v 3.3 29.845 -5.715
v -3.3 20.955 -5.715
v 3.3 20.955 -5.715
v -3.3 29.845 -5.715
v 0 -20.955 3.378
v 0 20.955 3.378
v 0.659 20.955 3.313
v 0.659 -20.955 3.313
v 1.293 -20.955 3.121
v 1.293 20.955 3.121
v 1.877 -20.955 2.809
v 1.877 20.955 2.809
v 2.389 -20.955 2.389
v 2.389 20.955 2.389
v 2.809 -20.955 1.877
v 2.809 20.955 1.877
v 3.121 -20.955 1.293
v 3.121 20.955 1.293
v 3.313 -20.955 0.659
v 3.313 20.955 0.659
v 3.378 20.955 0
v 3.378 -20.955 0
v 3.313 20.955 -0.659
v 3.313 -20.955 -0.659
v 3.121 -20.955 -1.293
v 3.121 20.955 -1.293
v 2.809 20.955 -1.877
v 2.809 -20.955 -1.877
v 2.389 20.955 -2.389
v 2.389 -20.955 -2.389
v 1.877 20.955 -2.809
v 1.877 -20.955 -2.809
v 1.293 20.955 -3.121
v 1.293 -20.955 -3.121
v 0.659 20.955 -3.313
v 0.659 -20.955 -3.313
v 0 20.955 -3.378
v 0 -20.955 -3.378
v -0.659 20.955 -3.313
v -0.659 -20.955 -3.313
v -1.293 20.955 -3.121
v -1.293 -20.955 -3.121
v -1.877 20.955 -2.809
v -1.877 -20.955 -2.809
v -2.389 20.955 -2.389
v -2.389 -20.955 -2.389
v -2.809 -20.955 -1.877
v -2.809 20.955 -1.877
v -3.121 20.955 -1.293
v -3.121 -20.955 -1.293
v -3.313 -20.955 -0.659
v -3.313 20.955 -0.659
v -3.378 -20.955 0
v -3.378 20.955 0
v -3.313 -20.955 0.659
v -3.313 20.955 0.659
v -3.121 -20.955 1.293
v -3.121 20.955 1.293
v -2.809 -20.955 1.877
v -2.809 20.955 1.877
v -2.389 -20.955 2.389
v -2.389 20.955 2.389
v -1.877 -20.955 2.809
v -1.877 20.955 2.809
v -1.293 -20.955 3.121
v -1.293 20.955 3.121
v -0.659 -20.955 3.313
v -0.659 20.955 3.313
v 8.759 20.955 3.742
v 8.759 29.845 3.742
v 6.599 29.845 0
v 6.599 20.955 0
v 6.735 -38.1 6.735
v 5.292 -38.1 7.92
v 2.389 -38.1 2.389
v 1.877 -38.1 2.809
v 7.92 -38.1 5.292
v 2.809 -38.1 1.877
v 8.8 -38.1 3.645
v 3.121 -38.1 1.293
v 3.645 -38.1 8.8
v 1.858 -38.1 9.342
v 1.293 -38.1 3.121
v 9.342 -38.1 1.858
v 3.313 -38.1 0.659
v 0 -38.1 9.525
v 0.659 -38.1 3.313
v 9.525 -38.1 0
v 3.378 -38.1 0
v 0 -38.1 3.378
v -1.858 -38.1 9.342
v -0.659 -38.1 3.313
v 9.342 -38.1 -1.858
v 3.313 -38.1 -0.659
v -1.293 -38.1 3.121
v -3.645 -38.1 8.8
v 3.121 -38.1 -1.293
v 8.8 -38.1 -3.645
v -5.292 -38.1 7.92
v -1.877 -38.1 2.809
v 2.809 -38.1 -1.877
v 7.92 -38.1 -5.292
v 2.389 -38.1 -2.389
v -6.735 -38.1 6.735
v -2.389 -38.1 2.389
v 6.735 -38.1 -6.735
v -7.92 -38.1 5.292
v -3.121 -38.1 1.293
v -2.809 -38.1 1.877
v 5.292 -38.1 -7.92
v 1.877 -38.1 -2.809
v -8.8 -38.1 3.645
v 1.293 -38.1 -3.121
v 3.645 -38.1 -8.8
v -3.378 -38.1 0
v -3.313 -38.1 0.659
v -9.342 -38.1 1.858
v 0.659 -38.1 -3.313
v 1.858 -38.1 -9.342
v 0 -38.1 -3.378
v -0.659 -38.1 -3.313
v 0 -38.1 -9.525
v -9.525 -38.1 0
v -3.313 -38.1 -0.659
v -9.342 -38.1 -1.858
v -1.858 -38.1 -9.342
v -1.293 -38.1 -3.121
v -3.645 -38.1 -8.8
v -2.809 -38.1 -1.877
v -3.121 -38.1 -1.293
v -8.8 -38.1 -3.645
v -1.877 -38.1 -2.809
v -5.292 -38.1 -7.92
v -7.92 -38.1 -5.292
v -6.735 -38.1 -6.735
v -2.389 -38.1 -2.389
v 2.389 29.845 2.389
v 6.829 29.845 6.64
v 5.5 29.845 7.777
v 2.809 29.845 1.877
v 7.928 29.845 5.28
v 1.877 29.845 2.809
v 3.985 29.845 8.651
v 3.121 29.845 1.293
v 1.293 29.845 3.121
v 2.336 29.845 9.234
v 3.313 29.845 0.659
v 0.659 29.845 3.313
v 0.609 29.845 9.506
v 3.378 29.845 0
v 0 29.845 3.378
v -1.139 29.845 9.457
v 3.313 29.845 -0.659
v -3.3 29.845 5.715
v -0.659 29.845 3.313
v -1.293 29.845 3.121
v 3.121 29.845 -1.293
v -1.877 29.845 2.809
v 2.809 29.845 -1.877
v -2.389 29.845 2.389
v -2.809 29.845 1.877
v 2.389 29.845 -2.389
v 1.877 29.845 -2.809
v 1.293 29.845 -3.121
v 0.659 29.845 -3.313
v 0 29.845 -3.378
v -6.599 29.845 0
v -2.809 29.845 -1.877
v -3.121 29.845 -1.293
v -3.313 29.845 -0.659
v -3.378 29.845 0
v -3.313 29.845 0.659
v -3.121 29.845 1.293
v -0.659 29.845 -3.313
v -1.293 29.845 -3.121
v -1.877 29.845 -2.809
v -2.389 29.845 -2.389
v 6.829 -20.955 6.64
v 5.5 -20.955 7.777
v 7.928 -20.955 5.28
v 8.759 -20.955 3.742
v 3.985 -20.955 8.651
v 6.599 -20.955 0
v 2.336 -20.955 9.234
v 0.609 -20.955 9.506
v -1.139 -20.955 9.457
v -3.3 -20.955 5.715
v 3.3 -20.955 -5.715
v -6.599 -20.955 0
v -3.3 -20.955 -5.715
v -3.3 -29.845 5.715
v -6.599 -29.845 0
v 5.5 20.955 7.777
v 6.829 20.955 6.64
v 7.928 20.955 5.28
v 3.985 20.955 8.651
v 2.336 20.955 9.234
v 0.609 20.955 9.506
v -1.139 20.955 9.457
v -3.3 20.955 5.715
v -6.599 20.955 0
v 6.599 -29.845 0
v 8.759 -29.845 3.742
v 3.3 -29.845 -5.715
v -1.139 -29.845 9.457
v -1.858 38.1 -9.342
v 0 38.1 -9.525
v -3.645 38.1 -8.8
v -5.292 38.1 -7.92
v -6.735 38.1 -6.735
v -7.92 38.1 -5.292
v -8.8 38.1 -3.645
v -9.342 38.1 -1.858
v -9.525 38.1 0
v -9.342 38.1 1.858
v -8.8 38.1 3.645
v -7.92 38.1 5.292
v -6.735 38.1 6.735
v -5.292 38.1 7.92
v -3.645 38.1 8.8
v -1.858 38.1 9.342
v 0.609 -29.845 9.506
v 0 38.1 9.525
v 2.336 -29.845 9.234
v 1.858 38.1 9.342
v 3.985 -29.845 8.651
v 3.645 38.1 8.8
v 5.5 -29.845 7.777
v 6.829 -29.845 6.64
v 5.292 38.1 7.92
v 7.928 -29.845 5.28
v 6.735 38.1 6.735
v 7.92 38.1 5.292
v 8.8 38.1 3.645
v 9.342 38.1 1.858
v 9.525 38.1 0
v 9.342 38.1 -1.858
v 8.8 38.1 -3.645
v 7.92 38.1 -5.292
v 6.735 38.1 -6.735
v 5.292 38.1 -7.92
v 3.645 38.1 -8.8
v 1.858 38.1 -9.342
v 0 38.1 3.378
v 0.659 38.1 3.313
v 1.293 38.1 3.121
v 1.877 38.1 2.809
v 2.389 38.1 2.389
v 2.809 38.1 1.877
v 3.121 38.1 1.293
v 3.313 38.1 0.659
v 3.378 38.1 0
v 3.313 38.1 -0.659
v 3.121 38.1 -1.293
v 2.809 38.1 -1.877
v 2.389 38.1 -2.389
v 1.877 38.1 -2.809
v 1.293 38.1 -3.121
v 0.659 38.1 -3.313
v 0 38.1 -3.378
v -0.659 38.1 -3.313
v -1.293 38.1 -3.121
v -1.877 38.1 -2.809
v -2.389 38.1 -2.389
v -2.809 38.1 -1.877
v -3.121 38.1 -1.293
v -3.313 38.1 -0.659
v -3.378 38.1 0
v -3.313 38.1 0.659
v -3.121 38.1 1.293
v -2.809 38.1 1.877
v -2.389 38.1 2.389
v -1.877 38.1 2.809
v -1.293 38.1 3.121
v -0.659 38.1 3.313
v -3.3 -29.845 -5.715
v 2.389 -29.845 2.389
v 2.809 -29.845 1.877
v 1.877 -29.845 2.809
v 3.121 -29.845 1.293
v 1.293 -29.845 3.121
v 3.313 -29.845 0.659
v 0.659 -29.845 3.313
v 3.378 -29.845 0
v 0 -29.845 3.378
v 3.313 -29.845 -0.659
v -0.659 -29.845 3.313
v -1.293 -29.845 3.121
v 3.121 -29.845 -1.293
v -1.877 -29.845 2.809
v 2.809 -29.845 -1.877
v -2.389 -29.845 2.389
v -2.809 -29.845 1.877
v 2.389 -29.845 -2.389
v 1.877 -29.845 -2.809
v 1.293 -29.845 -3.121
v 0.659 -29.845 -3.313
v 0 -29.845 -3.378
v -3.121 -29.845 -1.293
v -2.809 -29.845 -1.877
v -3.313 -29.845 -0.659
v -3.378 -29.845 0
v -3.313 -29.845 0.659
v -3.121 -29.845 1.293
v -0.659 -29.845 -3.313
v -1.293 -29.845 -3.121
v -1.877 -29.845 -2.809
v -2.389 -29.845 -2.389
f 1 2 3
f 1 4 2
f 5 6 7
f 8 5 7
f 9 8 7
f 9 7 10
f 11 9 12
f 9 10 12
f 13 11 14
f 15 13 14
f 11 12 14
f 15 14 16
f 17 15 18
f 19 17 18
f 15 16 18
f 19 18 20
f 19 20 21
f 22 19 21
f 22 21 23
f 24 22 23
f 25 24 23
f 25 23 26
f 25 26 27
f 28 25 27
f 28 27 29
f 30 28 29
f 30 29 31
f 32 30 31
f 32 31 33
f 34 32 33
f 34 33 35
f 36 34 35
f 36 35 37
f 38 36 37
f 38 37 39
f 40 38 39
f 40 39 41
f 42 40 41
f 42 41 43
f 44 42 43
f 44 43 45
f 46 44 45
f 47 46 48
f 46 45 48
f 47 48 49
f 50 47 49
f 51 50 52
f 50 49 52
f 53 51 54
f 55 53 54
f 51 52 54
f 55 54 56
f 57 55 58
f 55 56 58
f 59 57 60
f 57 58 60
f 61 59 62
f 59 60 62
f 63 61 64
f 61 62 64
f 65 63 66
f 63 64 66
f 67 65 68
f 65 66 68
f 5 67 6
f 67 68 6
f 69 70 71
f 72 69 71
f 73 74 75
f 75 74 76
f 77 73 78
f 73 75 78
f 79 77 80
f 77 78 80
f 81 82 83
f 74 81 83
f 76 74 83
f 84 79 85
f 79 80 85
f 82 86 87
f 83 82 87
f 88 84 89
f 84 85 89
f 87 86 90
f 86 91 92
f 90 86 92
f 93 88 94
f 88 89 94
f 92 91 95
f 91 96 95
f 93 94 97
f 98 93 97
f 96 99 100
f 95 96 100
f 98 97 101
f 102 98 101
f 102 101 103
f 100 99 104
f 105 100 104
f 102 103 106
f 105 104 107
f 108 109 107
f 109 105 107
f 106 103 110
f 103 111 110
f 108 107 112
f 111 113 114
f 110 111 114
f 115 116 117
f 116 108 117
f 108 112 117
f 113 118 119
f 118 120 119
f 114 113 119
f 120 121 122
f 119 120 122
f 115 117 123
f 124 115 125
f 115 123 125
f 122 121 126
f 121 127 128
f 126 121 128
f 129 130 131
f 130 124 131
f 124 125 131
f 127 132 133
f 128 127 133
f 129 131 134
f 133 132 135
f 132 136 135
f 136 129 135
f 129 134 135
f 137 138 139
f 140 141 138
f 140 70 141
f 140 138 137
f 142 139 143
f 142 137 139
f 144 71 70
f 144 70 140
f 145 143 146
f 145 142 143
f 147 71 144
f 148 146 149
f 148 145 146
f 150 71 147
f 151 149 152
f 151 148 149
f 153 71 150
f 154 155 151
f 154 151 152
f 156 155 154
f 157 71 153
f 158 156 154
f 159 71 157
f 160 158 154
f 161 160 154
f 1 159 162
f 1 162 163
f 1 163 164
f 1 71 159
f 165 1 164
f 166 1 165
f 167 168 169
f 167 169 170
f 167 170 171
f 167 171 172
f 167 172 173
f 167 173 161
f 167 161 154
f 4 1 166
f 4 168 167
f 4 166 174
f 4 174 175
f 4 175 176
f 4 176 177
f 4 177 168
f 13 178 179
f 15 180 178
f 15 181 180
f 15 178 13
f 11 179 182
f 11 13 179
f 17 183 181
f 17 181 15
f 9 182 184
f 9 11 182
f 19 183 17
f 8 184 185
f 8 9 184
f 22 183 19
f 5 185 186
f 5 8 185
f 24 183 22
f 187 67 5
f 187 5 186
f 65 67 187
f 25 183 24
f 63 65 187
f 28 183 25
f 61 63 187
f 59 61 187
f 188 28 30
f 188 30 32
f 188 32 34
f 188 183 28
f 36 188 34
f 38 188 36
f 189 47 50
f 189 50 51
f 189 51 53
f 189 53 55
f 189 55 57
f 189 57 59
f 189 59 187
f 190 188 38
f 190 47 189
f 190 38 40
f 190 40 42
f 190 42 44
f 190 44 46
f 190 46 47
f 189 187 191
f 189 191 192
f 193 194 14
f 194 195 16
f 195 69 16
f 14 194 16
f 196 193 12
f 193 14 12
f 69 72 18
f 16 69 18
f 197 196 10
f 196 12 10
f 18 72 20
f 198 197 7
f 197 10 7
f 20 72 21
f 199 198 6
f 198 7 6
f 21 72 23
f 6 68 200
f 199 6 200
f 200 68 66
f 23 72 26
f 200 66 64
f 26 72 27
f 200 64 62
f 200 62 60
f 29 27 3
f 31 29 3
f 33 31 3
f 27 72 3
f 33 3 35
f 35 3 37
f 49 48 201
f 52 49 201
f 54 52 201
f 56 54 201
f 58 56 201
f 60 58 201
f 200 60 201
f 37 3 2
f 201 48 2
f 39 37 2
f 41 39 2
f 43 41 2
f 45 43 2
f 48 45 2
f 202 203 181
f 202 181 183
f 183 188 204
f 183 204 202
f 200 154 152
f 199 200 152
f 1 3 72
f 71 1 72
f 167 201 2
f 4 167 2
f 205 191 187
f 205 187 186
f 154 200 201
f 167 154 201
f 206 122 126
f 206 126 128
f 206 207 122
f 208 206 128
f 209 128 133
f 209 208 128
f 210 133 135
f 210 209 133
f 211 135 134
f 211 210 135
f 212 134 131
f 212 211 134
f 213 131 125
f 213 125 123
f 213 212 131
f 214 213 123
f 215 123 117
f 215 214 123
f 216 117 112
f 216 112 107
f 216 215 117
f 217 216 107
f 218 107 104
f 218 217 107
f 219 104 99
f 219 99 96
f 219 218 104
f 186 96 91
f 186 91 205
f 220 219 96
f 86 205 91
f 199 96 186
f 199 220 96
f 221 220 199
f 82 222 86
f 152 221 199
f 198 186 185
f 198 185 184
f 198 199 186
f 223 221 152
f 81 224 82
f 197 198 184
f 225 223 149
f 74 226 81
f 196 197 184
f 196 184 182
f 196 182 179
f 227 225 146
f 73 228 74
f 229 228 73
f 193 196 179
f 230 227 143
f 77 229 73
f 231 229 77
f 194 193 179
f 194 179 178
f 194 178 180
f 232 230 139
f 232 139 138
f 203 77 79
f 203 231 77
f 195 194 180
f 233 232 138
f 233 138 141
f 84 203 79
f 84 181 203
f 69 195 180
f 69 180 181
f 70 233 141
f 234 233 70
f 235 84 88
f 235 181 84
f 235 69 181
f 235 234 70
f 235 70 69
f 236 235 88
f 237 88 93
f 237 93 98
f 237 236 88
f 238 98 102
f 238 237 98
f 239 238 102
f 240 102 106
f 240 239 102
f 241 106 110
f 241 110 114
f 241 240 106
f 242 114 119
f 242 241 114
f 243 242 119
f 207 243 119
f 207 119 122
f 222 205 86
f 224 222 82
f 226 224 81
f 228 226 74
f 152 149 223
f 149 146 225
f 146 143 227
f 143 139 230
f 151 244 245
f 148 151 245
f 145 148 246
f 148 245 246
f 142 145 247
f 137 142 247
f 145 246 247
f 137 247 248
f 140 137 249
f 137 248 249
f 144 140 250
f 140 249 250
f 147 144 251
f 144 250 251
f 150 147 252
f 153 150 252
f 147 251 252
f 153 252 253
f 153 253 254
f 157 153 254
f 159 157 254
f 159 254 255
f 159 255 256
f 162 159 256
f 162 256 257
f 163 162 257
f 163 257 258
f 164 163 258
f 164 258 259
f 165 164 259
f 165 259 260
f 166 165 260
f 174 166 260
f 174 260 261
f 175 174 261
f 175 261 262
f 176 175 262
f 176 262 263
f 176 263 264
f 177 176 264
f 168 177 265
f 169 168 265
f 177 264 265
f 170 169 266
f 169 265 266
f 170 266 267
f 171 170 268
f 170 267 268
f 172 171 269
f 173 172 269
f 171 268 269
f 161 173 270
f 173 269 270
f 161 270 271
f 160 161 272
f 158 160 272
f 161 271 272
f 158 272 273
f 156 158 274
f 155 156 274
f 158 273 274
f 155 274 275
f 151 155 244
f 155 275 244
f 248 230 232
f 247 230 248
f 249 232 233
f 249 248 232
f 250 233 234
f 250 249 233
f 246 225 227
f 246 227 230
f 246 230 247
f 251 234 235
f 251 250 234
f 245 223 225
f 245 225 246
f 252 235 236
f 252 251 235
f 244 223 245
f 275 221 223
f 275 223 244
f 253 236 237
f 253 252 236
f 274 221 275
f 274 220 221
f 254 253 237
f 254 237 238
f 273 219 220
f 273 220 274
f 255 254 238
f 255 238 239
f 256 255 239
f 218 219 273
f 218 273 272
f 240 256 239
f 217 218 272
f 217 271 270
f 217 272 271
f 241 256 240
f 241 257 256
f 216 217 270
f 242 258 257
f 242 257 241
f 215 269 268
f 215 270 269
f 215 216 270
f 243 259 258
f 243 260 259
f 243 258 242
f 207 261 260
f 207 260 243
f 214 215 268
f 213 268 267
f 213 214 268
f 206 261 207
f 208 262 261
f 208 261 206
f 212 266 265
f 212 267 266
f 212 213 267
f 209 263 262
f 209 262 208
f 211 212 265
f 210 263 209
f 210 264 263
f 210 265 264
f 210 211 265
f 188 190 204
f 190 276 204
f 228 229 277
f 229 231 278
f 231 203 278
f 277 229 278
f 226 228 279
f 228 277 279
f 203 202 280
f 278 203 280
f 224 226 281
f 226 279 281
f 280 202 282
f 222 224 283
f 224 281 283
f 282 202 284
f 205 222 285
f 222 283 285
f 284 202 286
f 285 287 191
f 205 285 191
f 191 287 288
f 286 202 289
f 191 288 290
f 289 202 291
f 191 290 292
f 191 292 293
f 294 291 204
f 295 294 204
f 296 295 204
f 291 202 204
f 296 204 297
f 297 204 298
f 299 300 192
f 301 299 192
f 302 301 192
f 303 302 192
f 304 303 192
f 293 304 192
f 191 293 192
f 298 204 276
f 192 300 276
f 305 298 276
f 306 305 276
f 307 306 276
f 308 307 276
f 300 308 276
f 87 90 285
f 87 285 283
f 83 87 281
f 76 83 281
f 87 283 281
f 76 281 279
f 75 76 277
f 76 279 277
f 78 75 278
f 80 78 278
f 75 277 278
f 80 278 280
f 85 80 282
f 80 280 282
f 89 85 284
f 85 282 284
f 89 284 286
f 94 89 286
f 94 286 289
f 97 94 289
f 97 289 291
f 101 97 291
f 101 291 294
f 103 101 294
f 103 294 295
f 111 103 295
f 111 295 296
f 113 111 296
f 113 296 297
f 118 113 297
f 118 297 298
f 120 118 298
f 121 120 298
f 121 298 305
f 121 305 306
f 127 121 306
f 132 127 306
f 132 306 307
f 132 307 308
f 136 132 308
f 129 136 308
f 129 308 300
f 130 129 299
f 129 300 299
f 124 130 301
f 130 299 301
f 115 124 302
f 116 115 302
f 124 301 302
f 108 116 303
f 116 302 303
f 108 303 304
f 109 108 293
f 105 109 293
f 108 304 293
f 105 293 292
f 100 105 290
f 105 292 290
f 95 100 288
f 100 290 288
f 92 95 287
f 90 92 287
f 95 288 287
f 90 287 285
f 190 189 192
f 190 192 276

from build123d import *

# Parameters (mm, degrees)
SKETCH1_R           = 9.525
BOSS_EXTRUDE1_DEPTH = 38.1
CUT_EXTRUDE1_DEPTH  = 4.445
SKETCH3_R           = 3.3782
CUT_EXTRUDE2_DEPTH  = 78.381465804


with BuildPart() as part:
    # Sketch1 → Boss-Extrude1 (new, symmetric)
    with BuildSketch(Plane(origin=(0, 0, 0), x_dir=(1, 0, 0), z_dir=(0, 1, 0))):
        with Locations(Location((0, 0, 0), (0, 0, 90))):
            Circle(SKETCH1_R)
    extrude(amount=BOSS_EXTRUDE1_DEPTH, both=True)

    # Sketch2 → Cut-Extrude1 (cut, symmetric)
    with BuildSketch(Plane(origin=(0, -25.4, 0), x_dir=(-1, 0, 0), z_dir=(0, -1, 0))):
        Polygon((-3.299556788, 5.715), (-6.599113577, 0), (6.599113577, 0), (3.299556788, 5.715), align=None)
        Polygon((6.599113577, 0), (-6.599113577, 0), (-3.299556788, -5.715), (3.299556788, -5.715), align=None)
        with BuildLine():
            ThreePointArc((1.139335183, -9.456613577), (-4.7625, -8.248891971), (-8.759335183, -3.741613577))
            Line((-8.759335183, -3.741613577), (-6.599113577, 0))
            Line((-6.599113577, 0), (-3.299556788, -5.715))
            Line((-3.299556788, -5.715), (3.299556788, -5.715))
            Line((3.299556788, -5.715), (1.139335183, -9.456613577))
        make_face()
    cut_extrude1 = extrude(amount=CUT_EXTRUDE1_DEPTH, both=True, mode=Mode.SUBTRACT)

    # Mirror1: Cut-Extrude1 across plane
    add(cut_extrude1.mirror(Plane.ZX), mode=Mode.SUBTRACT)

    # Sketch3 → Cut-Extrude2 (cut, through all)
    with BuildSketch(Plane(origin=(0, 38.1, 0), x_dir=(1, 0, 0), z_dir=(0, 1, 0))):
        with Locations(Location((0, 0, 0), (0, 0, 270))):
            Circle(SKETCH3_R)
    extrude(amount=-CUT_EXTRUDE2_DEPTH, mode=Mode.SUBTRACT)


solid = part.part
